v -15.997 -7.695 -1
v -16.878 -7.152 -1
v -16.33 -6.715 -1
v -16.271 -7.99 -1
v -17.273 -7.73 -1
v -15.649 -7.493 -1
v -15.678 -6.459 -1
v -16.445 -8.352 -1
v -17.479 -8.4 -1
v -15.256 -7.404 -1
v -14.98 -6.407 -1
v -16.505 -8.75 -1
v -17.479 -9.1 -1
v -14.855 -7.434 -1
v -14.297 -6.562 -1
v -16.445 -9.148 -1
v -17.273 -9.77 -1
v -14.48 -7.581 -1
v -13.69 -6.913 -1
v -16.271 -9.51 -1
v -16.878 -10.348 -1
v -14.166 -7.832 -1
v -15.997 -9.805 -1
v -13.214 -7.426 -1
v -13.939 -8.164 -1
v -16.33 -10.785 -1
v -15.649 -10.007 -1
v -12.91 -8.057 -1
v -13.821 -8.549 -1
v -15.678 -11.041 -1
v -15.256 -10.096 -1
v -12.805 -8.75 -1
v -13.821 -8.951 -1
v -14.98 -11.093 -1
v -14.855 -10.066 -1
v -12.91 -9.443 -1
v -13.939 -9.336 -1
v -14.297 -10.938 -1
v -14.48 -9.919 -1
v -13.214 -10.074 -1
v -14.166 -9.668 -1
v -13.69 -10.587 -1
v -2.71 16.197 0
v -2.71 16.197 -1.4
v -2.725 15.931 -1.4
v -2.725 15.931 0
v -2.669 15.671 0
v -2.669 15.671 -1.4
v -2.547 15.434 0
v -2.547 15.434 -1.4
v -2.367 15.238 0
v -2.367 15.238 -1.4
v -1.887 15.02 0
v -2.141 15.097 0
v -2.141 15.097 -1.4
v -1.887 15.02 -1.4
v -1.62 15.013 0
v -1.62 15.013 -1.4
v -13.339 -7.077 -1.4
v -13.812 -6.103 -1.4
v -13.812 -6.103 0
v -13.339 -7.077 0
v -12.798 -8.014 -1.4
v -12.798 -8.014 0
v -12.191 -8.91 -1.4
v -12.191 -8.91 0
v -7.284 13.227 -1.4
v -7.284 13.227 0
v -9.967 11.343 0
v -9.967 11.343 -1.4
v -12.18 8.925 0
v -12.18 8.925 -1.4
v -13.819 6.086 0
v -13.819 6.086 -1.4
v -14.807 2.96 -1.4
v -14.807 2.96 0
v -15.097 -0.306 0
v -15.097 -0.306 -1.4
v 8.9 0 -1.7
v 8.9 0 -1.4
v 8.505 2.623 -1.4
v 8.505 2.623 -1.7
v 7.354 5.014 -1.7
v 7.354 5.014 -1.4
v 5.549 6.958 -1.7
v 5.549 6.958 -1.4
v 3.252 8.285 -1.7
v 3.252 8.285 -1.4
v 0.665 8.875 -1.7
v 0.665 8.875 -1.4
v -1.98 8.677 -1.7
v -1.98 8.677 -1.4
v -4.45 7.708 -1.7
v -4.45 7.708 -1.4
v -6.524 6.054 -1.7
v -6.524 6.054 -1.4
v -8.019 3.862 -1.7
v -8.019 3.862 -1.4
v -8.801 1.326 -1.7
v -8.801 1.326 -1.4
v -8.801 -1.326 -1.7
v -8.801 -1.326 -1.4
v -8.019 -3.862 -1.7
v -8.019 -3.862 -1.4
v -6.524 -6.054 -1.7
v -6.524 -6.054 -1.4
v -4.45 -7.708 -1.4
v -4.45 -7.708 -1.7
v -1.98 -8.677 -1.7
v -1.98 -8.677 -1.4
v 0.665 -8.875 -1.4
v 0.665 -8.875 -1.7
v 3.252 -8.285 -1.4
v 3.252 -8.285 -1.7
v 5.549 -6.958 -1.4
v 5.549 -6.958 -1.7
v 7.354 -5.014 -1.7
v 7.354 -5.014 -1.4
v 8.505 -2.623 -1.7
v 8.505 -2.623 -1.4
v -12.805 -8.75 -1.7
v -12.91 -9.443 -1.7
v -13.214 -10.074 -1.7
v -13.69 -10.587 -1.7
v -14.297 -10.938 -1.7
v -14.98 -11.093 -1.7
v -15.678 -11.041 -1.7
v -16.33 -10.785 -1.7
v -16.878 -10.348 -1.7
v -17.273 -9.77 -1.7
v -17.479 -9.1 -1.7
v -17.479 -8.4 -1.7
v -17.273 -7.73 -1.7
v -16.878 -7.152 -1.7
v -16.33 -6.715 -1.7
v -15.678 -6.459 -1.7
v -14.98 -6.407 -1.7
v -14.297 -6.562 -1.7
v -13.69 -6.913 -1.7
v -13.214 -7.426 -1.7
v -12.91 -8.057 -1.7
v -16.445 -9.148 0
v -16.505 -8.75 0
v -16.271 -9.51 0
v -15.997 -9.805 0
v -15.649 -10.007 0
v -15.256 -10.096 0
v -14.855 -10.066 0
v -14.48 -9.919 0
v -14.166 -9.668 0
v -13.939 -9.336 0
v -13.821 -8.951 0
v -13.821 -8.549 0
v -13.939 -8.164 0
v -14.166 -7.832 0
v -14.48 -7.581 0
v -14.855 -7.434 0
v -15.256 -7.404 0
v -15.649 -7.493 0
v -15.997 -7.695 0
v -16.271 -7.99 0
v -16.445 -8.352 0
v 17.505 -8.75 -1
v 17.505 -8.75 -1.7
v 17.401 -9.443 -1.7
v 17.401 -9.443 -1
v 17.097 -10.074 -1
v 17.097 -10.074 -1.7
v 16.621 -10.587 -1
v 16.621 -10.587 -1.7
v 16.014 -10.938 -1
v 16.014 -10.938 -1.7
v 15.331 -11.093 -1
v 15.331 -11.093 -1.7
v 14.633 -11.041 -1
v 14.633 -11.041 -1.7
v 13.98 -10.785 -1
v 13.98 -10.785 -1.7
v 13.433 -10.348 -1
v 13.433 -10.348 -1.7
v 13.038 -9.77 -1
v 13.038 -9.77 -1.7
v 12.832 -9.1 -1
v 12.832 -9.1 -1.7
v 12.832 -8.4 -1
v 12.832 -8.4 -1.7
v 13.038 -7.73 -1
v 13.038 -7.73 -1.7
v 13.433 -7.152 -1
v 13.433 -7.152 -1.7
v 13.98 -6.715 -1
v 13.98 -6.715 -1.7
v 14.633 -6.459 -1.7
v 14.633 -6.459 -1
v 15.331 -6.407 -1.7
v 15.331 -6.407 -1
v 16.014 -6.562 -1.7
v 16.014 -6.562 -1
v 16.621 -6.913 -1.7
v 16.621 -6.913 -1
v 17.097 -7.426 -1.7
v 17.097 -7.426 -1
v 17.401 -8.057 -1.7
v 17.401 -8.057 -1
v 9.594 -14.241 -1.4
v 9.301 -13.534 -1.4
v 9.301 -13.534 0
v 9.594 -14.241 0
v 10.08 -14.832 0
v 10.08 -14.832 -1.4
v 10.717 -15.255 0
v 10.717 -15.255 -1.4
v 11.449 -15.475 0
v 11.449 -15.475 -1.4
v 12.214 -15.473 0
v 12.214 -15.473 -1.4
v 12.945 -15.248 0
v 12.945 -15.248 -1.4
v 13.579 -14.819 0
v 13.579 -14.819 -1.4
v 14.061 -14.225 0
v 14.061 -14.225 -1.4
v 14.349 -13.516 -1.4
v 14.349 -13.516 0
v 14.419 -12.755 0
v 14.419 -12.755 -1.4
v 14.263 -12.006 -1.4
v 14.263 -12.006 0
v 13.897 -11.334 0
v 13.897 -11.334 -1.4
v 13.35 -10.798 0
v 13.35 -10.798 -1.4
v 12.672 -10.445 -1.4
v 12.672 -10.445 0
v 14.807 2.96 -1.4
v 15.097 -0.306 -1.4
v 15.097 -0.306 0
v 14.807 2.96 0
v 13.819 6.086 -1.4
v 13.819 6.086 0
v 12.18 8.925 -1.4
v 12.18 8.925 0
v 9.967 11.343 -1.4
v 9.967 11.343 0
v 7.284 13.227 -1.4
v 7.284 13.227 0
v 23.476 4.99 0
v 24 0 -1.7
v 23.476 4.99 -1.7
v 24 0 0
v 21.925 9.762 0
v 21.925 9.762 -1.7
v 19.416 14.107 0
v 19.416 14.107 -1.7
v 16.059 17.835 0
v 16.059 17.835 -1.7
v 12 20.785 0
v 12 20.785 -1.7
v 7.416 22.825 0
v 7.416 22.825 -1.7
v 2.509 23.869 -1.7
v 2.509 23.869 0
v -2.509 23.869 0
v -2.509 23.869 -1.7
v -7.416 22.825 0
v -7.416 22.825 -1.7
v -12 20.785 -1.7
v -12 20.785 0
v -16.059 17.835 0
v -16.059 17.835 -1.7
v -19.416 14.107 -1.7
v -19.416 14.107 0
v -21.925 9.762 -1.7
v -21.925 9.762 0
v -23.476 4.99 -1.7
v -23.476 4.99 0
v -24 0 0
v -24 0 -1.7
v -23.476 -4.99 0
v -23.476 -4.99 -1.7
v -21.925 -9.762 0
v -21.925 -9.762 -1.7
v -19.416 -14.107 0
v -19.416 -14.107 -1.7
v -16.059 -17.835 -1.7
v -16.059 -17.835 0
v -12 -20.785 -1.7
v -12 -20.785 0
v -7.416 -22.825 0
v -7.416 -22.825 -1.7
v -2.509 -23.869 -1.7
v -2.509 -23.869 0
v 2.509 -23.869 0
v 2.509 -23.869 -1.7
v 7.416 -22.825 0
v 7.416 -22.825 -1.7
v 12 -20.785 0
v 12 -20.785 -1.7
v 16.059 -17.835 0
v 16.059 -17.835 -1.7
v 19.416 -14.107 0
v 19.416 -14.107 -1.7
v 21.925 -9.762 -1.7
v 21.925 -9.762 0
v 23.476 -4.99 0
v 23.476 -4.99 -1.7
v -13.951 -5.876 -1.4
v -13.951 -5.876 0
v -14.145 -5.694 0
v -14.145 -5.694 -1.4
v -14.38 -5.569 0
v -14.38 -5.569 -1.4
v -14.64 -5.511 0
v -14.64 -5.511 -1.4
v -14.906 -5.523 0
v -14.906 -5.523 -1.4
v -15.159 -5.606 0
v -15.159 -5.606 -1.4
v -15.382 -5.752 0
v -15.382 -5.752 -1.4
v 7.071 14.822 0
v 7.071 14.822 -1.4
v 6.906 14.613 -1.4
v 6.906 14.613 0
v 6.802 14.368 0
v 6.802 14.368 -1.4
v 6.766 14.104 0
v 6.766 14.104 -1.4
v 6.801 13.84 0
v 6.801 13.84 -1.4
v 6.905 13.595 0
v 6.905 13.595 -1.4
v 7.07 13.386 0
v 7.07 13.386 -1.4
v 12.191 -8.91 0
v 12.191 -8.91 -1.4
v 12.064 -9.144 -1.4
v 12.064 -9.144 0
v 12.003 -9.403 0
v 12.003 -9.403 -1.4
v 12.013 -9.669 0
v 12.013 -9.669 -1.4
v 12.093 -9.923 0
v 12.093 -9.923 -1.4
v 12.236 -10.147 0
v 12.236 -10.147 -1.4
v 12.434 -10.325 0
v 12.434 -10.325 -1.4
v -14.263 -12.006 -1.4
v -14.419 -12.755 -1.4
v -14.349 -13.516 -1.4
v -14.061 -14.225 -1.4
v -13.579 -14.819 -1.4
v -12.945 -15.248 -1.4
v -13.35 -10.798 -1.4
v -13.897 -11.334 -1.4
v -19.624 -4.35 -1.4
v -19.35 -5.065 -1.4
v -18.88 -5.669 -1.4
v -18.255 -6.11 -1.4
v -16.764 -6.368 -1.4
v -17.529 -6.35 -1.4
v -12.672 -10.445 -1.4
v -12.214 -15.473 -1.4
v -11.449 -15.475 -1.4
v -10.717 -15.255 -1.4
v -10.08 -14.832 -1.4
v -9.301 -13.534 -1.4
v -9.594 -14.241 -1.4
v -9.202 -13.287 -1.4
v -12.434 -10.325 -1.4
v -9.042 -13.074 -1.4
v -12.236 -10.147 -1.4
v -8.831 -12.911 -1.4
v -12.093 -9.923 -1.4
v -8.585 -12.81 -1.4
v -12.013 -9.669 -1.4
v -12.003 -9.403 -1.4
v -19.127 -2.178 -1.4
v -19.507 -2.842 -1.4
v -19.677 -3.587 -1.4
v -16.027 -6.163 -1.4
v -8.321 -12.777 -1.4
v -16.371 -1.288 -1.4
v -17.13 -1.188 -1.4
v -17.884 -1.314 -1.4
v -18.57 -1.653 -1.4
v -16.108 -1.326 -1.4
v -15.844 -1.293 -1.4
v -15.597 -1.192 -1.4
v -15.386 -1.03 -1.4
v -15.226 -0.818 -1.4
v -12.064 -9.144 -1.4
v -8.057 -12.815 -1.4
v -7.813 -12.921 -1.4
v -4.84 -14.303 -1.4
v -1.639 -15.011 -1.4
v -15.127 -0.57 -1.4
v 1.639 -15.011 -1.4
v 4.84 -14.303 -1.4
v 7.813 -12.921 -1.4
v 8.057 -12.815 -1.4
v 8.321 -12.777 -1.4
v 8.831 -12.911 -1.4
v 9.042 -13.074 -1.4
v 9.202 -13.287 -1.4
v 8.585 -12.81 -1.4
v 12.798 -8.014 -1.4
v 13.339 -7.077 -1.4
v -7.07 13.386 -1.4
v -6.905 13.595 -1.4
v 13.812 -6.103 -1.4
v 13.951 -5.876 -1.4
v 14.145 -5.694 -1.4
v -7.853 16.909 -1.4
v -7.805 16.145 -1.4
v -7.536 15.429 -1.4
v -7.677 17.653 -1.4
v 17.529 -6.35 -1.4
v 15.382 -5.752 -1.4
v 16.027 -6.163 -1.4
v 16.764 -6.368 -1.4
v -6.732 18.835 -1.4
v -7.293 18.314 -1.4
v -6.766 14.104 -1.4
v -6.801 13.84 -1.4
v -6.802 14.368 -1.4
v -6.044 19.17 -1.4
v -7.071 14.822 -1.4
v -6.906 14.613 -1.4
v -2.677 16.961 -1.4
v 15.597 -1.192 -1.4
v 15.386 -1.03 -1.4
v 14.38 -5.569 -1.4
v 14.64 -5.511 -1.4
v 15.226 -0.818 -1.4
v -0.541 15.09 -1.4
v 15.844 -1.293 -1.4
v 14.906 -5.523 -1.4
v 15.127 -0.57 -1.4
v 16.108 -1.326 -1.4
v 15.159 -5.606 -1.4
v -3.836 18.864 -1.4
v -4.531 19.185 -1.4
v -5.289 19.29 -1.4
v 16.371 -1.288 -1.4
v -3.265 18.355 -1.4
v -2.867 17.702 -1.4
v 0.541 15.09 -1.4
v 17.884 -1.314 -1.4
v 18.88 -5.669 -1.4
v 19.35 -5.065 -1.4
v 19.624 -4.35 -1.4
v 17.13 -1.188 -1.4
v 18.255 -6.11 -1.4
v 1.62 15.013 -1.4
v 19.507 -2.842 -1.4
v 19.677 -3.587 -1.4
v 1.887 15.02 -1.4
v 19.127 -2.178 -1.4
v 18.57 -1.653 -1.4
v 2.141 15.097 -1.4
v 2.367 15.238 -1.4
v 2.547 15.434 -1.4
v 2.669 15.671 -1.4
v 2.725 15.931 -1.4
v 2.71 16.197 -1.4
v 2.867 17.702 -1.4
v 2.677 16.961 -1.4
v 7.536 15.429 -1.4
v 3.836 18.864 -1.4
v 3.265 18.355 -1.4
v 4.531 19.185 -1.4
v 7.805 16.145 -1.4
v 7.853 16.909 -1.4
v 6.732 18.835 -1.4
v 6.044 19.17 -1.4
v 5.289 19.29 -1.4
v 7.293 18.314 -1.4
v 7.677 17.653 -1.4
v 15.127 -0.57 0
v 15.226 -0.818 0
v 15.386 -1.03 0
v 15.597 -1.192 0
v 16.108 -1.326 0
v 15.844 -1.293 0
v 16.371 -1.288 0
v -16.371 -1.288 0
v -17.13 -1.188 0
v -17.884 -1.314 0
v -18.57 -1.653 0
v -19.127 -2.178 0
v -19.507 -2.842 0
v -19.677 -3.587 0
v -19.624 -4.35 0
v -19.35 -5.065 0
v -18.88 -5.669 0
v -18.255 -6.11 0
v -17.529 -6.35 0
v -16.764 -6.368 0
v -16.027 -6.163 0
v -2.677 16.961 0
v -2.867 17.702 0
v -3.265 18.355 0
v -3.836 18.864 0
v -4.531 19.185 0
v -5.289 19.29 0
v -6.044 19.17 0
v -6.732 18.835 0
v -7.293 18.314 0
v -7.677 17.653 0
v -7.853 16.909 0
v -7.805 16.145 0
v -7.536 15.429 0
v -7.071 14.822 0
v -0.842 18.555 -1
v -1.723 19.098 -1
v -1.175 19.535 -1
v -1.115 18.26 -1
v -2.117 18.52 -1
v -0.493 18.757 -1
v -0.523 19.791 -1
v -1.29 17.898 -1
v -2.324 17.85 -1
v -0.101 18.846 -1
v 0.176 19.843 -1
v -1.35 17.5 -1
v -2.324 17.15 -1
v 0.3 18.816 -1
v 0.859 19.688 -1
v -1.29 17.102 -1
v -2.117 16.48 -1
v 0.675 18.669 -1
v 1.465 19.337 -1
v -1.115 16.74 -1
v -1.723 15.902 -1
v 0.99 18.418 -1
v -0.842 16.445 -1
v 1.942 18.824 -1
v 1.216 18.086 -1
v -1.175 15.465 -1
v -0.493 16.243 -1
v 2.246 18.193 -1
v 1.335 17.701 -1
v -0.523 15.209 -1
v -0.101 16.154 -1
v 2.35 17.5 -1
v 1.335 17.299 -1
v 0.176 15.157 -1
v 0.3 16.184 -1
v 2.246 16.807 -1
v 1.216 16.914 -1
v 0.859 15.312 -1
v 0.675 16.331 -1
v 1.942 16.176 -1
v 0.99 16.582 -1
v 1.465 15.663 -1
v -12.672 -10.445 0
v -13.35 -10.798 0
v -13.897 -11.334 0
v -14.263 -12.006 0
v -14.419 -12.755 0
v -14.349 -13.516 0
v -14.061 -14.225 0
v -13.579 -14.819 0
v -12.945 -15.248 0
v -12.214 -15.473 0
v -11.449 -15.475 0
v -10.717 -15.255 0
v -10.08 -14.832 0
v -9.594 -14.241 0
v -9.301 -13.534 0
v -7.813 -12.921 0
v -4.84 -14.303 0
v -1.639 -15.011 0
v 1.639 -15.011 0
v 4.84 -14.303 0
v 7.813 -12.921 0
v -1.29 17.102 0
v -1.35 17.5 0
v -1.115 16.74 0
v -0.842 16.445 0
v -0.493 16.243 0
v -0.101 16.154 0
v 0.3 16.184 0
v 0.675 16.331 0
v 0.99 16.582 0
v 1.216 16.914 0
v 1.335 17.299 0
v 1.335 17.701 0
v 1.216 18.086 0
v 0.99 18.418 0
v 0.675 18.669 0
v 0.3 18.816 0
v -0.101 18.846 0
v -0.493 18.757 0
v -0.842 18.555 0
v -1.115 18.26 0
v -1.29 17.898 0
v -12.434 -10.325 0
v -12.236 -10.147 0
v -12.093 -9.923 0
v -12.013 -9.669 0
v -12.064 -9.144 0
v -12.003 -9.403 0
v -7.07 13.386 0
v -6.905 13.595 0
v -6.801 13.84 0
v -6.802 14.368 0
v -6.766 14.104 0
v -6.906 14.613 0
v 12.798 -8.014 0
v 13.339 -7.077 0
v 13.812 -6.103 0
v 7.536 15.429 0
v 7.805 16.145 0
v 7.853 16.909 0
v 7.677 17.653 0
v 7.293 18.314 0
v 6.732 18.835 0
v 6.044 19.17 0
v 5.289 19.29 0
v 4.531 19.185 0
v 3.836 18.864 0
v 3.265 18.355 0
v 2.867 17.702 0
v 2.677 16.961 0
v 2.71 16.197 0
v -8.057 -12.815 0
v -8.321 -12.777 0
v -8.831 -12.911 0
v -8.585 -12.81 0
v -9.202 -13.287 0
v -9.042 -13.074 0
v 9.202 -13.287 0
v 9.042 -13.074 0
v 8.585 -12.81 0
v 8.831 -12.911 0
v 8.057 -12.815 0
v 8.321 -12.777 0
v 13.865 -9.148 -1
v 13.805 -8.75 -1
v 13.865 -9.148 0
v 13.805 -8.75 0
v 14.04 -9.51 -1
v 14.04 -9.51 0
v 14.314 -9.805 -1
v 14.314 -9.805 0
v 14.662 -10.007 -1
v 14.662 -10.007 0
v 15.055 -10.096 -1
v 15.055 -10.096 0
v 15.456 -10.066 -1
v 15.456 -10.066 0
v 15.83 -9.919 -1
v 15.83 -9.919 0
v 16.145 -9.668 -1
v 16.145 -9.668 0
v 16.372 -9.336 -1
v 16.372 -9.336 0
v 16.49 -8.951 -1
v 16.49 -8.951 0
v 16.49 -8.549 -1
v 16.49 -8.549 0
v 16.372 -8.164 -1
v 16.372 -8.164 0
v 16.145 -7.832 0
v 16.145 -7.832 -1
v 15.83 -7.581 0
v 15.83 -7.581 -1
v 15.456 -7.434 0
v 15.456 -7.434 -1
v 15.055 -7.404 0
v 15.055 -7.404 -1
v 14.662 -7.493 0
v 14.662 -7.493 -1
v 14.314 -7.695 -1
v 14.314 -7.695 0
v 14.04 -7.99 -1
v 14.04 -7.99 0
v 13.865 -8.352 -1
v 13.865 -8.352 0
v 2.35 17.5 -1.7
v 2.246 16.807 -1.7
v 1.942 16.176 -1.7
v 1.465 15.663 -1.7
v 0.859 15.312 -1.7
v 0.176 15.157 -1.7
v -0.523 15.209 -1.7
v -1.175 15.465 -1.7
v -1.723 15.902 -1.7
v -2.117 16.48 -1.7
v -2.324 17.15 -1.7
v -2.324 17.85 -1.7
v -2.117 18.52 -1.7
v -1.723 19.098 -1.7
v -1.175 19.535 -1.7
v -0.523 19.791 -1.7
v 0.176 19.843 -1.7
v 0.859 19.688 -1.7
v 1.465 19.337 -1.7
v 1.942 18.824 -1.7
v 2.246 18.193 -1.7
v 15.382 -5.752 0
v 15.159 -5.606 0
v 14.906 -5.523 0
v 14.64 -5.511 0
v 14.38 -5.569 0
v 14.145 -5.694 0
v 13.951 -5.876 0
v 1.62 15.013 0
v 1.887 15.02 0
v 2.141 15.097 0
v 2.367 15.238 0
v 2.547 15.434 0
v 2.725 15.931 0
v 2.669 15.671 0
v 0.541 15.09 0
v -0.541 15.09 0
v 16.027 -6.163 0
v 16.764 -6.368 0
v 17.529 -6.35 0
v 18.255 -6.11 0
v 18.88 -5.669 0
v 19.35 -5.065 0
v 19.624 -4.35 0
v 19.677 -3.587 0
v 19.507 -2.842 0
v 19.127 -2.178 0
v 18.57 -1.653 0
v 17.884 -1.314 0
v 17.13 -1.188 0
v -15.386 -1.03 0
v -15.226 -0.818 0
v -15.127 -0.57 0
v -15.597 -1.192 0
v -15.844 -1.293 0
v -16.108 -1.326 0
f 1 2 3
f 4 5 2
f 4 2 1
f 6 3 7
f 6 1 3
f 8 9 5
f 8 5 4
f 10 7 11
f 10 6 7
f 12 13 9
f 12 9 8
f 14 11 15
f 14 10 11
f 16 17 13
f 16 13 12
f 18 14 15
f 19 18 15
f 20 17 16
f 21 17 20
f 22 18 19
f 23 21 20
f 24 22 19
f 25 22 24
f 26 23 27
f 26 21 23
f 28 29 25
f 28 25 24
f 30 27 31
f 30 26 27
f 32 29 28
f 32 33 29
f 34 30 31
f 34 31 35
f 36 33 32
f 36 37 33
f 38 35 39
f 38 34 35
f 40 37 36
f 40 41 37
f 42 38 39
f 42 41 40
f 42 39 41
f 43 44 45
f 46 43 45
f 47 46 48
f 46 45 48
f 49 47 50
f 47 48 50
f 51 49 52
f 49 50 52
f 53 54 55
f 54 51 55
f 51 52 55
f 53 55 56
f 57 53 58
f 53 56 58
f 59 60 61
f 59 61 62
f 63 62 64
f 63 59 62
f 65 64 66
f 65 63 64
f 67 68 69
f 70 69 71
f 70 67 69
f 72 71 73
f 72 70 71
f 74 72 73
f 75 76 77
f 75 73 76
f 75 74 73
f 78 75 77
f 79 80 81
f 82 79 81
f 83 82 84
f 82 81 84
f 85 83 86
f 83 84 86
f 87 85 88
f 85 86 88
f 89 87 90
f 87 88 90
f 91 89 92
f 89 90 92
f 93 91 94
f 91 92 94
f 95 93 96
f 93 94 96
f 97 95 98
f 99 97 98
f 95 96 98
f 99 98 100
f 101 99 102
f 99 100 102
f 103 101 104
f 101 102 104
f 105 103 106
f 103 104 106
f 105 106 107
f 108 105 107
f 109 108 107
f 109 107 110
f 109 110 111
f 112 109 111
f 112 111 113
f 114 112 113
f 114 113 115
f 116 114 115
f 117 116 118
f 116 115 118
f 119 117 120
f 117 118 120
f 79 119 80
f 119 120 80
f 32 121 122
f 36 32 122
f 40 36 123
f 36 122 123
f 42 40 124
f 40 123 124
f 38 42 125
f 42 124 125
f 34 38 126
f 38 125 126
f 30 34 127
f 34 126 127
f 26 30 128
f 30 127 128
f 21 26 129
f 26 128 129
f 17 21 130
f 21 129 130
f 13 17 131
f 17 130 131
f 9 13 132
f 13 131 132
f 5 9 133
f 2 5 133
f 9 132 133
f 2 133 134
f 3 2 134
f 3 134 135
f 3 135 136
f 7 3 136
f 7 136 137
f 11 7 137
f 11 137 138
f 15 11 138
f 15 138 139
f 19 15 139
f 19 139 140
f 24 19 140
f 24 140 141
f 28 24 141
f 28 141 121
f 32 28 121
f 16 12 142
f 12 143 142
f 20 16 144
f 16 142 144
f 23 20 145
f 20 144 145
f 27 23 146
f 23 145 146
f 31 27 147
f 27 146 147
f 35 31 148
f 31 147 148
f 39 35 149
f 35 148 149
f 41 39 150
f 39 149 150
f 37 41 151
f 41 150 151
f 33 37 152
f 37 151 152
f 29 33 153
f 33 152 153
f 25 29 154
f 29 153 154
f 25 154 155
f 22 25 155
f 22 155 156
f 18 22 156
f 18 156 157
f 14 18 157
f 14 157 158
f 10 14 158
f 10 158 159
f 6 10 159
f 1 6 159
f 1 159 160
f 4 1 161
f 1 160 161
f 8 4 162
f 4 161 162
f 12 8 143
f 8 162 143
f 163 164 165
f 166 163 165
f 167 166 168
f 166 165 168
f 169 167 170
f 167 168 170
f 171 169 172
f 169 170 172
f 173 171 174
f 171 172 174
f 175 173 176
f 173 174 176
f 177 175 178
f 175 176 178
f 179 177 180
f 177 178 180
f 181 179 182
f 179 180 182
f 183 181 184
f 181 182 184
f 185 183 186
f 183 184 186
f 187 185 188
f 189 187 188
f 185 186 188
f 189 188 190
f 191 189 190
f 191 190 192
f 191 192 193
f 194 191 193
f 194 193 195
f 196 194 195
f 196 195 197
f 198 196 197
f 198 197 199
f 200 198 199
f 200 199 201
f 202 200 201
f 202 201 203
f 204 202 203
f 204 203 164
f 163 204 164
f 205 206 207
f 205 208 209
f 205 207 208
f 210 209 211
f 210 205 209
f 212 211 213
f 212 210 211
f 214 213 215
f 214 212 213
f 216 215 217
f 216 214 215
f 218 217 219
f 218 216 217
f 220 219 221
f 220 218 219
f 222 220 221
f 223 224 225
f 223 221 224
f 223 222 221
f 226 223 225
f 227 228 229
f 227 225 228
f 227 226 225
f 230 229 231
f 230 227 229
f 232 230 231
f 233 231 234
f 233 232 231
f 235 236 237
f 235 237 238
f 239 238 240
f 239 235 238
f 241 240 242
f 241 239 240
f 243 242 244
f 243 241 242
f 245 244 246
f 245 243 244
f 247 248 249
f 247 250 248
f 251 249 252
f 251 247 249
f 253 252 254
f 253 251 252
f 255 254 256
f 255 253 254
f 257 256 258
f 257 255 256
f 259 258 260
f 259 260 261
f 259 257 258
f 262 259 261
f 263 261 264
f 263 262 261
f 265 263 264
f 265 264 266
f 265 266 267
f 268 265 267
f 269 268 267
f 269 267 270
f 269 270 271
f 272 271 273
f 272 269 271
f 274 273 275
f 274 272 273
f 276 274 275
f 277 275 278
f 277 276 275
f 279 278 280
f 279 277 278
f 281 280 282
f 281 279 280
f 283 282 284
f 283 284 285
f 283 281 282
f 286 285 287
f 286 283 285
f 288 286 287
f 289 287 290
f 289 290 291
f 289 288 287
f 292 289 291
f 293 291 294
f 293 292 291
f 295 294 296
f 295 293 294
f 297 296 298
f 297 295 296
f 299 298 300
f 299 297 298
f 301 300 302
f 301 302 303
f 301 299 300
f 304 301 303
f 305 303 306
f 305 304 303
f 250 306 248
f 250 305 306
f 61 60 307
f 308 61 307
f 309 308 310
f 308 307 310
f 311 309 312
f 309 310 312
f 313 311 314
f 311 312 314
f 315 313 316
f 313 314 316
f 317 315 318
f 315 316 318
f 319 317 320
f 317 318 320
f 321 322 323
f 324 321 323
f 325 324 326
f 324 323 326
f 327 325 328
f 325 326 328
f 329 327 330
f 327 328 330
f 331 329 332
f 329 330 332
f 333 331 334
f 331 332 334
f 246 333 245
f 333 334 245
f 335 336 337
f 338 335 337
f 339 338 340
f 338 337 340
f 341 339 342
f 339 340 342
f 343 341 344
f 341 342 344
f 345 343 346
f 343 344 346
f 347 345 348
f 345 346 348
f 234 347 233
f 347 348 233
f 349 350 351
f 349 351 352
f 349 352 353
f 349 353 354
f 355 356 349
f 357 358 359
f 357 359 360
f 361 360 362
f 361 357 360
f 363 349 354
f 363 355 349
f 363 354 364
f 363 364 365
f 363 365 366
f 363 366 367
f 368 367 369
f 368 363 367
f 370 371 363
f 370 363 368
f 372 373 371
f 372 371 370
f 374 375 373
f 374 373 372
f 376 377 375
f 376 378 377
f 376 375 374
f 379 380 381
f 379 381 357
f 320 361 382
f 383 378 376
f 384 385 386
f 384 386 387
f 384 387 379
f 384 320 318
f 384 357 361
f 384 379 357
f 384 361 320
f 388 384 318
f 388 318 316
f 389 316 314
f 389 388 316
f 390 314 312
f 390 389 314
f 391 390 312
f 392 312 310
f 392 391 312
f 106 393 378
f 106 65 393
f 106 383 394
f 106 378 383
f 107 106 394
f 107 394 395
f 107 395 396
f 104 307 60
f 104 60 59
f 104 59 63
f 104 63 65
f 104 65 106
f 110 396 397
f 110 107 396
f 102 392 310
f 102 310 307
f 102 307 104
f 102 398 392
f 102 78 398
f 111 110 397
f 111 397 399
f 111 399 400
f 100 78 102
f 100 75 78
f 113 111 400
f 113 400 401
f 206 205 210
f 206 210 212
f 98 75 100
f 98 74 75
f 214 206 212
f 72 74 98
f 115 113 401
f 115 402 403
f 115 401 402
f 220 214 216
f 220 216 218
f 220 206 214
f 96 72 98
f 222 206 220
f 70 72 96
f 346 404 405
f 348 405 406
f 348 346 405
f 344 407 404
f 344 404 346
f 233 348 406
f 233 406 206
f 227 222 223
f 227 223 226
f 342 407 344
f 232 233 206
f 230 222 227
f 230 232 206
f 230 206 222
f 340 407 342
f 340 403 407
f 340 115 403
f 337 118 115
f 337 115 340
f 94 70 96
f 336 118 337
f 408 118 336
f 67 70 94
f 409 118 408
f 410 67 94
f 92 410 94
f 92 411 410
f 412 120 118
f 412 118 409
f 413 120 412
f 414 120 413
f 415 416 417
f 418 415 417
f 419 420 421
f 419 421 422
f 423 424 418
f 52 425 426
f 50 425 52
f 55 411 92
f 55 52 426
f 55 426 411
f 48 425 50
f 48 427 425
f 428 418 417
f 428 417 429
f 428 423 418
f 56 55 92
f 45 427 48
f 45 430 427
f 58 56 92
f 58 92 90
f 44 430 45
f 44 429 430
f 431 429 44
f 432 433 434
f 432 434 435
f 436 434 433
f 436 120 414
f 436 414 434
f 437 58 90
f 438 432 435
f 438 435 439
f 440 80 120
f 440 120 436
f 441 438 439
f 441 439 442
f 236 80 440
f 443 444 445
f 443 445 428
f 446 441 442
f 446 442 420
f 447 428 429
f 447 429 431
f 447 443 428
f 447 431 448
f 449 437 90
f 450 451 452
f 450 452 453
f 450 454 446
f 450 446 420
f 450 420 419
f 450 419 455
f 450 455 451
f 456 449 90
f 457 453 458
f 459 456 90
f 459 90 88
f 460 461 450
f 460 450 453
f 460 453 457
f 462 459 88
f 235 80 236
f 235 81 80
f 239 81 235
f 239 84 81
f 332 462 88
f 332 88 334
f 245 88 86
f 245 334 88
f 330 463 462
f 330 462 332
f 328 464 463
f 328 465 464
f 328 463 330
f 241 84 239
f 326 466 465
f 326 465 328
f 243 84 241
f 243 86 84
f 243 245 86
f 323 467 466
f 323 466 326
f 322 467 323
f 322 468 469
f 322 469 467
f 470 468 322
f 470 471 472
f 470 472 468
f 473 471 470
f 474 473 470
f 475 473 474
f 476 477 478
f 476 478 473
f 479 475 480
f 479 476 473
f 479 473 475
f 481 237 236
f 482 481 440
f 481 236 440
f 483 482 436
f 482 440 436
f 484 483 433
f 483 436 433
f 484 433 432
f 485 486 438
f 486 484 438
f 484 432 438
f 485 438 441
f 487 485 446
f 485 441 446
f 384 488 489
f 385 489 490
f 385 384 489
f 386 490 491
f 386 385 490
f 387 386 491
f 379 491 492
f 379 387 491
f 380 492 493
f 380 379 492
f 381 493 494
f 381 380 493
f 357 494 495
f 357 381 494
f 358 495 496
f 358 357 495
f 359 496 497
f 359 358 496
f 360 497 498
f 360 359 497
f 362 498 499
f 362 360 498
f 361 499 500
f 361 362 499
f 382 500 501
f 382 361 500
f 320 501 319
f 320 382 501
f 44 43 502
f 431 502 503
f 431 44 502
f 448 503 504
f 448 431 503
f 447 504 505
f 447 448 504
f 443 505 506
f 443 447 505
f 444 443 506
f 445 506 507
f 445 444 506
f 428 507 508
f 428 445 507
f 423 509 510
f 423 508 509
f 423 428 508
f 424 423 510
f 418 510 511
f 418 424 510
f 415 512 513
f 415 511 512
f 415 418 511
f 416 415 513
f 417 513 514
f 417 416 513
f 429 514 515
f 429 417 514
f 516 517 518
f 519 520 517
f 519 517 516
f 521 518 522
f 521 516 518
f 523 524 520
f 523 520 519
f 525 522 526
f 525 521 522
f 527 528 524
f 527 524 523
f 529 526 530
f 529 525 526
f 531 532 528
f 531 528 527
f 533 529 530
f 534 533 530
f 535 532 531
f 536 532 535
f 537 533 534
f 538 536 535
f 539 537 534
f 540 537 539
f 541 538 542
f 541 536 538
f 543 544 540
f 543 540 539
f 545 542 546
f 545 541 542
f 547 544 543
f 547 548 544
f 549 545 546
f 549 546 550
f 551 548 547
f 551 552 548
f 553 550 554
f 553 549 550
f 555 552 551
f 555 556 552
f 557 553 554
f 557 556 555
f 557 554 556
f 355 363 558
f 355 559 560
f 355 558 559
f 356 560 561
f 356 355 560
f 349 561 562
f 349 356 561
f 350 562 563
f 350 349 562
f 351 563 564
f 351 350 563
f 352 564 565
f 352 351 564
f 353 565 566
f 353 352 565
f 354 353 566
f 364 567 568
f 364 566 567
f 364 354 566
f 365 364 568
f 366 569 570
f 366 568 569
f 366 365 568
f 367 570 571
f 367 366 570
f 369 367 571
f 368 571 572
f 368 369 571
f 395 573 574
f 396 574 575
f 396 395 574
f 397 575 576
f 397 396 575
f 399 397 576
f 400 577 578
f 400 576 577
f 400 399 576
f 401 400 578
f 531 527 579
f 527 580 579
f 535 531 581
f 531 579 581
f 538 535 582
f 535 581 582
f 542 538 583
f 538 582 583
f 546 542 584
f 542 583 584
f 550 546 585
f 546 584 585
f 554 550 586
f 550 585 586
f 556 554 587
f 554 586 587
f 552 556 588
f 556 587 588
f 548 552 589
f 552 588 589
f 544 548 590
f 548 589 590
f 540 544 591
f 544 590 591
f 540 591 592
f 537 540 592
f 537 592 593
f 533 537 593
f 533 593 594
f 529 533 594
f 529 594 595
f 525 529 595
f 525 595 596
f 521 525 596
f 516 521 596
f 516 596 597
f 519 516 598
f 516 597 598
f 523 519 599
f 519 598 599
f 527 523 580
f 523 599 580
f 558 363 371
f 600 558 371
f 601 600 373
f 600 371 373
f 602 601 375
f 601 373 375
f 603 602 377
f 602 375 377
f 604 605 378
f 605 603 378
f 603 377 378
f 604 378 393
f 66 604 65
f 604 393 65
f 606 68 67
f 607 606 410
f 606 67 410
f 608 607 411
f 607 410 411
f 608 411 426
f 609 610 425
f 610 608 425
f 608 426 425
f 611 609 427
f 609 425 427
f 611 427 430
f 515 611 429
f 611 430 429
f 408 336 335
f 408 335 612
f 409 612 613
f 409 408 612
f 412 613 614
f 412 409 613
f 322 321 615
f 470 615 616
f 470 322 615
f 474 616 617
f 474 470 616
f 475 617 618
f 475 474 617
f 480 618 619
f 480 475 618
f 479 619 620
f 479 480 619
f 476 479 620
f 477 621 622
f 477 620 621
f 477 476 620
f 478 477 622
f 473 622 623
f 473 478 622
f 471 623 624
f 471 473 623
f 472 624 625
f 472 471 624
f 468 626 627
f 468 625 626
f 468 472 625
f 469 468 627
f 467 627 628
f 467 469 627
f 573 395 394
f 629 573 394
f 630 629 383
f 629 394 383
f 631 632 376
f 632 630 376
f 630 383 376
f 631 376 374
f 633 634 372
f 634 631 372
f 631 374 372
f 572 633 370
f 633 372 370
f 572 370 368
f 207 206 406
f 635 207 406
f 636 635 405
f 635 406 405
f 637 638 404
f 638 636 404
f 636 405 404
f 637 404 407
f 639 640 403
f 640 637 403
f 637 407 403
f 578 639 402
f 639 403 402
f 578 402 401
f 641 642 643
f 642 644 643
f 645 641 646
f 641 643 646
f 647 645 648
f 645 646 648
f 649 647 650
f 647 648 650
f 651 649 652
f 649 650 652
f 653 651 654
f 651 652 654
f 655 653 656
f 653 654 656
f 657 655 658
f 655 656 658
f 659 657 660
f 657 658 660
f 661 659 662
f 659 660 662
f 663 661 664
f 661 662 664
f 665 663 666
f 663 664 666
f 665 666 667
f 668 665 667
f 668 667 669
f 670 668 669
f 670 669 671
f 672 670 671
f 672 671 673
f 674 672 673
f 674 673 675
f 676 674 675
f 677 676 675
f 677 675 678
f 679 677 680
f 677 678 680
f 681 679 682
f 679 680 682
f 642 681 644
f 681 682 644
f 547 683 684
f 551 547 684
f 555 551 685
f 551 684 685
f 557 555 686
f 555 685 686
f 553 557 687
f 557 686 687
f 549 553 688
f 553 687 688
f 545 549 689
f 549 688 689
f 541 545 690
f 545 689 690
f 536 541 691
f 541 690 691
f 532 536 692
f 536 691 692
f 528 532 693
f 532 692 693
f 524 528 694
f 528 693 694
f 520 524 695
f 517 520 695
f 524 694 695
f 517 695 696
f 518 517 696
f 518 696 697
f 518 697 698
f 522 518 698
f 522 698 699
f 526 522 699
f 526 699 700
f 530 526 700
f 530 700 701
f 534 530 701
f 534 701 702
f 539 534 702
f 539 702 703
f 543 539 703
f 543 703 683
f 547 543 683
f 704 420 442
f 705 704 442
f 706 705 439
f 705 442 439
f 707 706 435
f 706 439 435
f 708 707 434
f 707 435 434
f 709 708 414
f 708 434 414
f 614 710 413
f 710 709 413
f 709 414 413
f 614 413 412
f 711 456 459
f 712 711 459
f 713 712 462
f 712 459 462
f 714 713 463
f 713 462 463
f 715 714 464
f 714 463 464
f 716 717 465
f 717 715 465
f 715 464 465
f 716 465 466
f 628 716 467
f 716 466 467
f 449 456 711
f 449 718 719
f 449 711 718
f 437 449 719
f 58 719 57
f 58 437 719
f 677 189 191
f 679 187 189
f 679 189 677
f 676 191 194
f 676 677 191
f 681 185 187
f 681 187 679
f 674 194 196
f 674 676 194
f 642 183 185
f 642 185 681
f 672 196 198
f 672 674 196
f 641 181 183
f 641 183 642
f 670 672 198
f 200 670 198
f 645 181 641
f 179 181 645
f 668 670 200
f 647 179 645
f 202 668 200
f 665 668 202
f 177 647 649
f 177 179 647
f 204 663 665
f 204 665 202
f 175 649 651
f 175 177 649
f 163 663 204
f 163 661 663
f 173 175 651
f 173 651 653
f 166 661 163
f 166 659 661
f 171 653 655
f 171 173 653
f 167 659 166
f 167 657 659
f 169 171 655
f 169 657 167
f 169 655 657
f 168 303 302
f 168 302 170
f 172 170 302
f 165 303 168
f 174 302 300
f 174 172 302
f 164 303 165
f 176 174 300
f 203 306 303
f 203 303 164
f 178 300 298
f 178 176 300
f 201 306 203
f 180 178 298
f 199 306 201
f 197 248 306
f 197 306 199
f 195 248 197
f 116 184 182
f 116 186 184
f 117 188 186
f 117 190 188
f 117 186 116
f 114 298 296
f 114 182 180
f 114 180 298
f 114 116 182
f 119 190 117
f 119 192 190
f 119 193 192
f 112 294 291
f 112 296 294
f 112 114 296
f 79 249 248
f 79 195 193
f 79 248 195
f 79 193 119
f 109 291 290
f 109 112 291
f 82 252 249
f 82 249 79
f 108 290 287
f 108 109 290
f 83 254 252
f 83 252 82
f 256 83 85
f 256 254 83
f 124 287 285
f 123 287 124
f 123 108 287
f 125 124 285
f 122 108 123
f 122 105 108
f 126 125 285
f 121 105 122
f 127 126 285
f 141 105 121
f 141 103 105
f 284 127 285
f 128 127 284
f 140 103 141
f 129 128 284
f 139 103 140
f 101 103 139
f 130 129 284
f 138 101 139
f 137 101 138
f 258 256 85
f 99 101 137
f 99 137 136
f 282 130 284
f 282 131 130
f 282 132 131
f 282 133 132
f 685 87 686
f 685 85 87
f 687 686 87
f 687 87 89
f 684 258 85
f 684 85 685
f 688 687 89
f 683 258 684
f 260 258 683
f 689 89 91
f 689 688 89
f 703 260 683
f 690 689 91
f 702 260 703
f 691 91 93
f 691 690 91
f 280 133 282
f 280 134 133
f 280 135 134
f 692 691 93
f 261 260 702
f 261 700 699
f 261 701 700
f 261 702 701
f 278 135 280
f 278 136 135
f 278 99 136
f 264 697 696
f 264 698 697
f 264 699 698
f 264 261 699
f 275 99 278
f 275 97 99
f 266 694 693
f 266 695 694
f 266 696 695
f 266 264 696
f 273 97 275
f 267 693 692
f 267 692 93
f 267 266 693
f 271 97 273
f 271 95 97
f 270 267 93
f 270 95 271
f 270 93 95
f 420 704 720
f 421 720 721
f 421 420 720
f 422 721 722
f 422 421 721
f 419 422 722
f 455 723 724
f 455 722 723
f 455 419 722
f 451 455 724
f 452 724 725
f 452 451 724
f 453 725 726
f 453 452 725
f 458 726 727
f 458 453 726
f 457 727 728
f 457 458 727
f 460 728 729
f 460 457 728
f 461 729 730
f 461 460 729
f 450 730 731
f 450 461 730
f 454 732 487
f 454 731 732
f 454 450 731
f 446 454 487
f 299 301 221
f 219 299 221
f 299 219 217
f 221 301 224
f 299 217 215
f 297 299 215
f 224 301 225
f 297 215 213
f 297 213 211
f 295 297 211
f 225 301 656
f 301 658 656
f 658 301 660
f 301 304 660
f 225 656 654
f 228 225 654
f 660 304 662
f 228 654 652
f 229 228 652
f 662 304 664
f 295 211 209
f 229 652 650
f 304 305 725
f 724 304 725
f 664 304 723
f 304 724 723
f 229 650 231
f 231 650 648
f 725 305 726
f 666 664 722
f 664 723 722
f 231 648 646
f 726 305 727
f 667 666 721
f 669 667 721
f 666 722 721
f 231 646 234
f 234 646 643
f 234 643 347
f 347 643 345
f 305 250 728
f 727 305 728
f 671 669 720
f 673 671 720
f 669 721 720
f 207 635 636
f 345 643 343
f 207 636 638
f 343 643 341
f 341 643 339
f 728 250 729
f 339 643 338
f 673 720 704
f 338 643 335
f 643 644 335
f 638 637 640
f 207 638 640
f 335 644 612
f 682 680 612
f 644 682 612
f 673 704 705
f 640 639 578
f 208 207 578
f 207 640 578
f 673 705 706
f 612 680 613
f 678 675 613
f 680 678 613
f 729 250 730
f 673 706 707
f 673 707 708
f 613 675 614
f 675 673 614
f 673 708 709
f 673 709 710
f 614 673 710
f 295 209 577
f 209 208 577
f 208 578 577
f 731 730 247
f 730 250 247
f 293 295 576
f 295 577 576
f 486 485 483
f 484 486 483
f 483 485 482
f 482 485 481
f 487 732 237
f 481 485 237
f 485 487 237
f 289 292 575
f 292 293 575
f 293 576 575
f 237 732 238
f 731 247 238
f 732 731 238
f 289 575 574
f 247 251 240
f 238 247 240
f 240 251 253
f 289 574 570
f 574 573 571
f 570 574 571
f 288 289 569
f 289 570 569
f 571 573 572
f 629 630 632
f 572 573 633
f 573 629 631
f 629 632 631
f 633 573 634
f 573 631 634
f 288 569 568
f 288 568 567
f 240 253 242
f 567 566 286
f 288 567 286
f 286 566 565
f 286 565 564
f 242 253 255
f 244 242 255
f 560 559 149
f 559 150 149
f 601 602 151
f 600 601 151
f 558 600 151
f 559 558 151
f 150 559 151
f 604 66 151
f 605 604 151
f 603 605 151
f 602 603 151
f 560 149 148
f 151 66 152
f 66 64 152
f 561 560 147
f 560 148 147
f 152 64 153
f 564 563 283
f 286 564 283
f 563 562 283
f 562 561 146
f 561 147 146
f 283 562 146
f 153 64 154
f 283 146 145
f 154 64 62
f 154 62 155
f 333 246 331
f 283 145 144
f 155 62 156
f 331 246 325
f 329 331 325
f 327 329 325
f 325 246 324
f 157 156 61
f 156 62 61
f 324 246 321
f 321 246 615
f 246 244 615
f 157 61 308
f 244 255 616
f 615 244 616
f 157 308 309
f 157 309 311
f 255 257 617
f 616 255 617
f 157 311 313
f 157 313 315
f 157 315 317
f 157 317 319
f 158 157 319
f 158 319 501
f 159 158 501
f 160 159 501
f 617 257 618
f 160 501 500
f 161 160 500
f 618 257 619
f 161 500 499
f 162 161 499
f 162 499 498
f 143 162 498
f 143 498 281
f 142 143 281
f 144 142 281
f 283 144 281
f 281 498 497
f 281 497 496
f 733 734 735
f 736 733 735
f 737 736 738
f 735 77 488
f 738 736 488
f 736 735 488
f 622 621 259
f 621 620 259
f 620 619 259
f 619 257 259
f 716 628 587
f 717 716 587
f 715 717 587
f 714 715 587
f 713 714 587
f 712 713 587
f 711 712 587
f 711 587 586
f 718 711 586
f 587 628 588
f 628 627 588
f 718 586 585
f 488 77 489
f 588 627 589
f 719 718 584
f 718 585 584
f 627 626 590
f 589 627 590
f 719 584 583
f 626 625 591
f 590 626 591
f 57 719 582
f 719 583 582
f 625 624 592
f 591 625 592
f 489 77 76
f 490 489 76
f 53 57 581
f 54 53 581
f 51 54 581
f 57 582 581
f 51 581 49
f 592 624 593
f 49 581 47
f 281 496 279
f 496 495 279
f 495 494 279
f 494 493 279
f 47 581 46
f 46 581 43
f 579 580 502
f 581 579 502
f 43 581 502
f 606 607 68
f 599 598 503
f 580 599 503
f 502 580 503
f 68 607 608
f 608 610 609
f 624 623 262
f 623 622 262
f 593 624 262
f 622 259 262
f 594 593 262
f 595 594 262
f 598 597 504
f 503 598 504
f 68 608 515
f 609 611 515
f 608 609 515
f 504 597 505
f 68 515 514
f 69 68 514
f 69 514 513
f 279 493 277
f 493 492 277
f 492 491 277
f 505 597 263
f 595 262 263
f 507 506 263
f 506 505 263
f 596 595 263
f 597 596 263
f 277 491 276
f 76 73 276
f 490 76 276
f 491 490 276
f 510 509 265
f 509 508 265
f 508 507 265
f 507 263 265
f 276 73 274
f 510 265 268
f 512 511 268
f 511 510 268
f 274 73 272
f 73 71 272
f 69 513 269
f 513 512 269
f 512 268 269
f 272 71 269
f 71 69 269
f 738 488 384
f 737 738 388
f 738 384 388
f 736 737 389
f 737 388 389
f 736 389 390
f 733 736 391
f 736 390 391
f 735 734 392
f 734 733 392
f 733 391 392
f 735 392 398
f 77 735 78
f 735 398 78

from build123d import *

# Parameters (mm, degrees)
SKETCH_W         = 15.1
SKETCH_H         = 1.7
POCKET_DEPTH     = 5.2
HOLE_D           = 2.7
HOLE_CBORE_D     = 4.7
HOLE_CBORE_DEPTH = 0.7


with BuildPart() as part:
    # Sketch → Revolution (revolve)
    with BuildSketch(Plane.XZ):
        with Locations((16.45, 0.85)):
            Rectangle(SKETCH_W, SKETCH_H)
    revolve(axis=Axis((0, 0, 0), (0, 0, 1)))

    # Sketch001 → Pocket (cut)
    with BuildSketch(Plane.XY.offset(0.3)):
        with BuildLine():
            ThreePointArc((-16.371276, -1.287625), (-19.62355, -4.350436), (-15.381589, -5.751816))
            ThreePointArc((-13.811681, -6.103071), (-14.508018, -5.531376), (-15.381589, -5.751816))
            ThreePointArc((-13.811681, -6.103071), (-13.076984, -7.55), (-12.191255, -8.909731))
            ThreePointArc((-12.672013, -10.444939), (-12.044321, -9.798624), (-12.191255, -8.909731))
            ThreePointArc((-12.672013, -10.444939), (-13.579363, -14.819274), (-9.300754, -13.534129))
            ThreePointArc((-7.813289, -12.921398), (-8.711606, -12.852495), (-9.300754, -13.534129))
            ThreePointArc((-7.813289, -12.921398), (0, -15.1), (7.813289, -12.921398))
            ThreePointArc((9.300754, -13.534129), (8.711606, -12.852495), (7.813289, -12.921398))
            ThreePointArc((9.300754, -13.534129), (13.579363, -14.819274), (12.672013, -10.444939))
            ThreePointArc((12.191255, -8.909731), (12.044321, -9.798624), (12.672013, -10.444939))
            ThreePointArc((12.191255, -8.909731), (13.076984, -7.55), (13.811681, -6.103071))
            ThreePointArc((15.381589, -5.751816), (14.508018, -5.531376), (13.811681, -6.103071))
            ThreePointArc((15.381589, -5.751816), (19.62355, -4.350436), (16.371276, -1.287625))
            ThreePointArc((15.096903, -0.305808), (15.48639, -1.118224), (16.371276, -1.287625))
            ThreePointArc((15.096903, -0.305808), (13.076984, 7.55), (7.283614, 13.227206))
            ThreePointArc((7.070522, 14.821754), (6.774784, 13.970719), (7.283614, 13.227206))
            ThreePointArc((7.070522, 14.821754), (6.044187, 19.169711), (2.709576, 16.196755))
            ThreePointArc((1.620426, 15.012802), (2.463697, 15.33), (2.709576, 16.196755))
            ThreePointArc((1.620426, 15.012802), (0, 15.1), (-1.620426, 15.012802))
            ThreePointArc((-2.709576, 16.196755), (-2.463697, 15.33), (-1.620426, 15.012802))
            ThreePointArc((-2.709576, 16.196755), (-6.044187, 19.169711), (-7.070522, 14.821754))
            ThreePointArc((-7.283614, 13.227206), (-6.774784, 13.970719), (-7.070522, 14.821754))
            ThreePointArc((-7.283614, 13.227206), (-13.076984, 7.55), (-15.096903, -0.305808))
            ThreePointArc((-16.371276, -1.287625), (-15.48639, -1.118224), (-15.096903, -0.305808))
        make_face()
    extrude(amount=POCKET_DEPTH, mode=Mode.SUBTRACT)

    # Hole (through all)
    with Locations(Plane(origin=(0, 0, 0), x_dir=(1, 0, 0), z_dir=(0, 0, -1))):
        with Locations((0, -17.5), (-15.155445, 8.75), (15.155445, 8.75)):
            CounterBoreHole(HOLE_D / 2, HOLE_CBORE_D / 2, HOLE_CBORE_DEPTH)


with BuildPart() as part_1:
    # Clone placement: moved
    add(part.part.moved(Location((0, 0, -1.7))))


solid = part_1.part
